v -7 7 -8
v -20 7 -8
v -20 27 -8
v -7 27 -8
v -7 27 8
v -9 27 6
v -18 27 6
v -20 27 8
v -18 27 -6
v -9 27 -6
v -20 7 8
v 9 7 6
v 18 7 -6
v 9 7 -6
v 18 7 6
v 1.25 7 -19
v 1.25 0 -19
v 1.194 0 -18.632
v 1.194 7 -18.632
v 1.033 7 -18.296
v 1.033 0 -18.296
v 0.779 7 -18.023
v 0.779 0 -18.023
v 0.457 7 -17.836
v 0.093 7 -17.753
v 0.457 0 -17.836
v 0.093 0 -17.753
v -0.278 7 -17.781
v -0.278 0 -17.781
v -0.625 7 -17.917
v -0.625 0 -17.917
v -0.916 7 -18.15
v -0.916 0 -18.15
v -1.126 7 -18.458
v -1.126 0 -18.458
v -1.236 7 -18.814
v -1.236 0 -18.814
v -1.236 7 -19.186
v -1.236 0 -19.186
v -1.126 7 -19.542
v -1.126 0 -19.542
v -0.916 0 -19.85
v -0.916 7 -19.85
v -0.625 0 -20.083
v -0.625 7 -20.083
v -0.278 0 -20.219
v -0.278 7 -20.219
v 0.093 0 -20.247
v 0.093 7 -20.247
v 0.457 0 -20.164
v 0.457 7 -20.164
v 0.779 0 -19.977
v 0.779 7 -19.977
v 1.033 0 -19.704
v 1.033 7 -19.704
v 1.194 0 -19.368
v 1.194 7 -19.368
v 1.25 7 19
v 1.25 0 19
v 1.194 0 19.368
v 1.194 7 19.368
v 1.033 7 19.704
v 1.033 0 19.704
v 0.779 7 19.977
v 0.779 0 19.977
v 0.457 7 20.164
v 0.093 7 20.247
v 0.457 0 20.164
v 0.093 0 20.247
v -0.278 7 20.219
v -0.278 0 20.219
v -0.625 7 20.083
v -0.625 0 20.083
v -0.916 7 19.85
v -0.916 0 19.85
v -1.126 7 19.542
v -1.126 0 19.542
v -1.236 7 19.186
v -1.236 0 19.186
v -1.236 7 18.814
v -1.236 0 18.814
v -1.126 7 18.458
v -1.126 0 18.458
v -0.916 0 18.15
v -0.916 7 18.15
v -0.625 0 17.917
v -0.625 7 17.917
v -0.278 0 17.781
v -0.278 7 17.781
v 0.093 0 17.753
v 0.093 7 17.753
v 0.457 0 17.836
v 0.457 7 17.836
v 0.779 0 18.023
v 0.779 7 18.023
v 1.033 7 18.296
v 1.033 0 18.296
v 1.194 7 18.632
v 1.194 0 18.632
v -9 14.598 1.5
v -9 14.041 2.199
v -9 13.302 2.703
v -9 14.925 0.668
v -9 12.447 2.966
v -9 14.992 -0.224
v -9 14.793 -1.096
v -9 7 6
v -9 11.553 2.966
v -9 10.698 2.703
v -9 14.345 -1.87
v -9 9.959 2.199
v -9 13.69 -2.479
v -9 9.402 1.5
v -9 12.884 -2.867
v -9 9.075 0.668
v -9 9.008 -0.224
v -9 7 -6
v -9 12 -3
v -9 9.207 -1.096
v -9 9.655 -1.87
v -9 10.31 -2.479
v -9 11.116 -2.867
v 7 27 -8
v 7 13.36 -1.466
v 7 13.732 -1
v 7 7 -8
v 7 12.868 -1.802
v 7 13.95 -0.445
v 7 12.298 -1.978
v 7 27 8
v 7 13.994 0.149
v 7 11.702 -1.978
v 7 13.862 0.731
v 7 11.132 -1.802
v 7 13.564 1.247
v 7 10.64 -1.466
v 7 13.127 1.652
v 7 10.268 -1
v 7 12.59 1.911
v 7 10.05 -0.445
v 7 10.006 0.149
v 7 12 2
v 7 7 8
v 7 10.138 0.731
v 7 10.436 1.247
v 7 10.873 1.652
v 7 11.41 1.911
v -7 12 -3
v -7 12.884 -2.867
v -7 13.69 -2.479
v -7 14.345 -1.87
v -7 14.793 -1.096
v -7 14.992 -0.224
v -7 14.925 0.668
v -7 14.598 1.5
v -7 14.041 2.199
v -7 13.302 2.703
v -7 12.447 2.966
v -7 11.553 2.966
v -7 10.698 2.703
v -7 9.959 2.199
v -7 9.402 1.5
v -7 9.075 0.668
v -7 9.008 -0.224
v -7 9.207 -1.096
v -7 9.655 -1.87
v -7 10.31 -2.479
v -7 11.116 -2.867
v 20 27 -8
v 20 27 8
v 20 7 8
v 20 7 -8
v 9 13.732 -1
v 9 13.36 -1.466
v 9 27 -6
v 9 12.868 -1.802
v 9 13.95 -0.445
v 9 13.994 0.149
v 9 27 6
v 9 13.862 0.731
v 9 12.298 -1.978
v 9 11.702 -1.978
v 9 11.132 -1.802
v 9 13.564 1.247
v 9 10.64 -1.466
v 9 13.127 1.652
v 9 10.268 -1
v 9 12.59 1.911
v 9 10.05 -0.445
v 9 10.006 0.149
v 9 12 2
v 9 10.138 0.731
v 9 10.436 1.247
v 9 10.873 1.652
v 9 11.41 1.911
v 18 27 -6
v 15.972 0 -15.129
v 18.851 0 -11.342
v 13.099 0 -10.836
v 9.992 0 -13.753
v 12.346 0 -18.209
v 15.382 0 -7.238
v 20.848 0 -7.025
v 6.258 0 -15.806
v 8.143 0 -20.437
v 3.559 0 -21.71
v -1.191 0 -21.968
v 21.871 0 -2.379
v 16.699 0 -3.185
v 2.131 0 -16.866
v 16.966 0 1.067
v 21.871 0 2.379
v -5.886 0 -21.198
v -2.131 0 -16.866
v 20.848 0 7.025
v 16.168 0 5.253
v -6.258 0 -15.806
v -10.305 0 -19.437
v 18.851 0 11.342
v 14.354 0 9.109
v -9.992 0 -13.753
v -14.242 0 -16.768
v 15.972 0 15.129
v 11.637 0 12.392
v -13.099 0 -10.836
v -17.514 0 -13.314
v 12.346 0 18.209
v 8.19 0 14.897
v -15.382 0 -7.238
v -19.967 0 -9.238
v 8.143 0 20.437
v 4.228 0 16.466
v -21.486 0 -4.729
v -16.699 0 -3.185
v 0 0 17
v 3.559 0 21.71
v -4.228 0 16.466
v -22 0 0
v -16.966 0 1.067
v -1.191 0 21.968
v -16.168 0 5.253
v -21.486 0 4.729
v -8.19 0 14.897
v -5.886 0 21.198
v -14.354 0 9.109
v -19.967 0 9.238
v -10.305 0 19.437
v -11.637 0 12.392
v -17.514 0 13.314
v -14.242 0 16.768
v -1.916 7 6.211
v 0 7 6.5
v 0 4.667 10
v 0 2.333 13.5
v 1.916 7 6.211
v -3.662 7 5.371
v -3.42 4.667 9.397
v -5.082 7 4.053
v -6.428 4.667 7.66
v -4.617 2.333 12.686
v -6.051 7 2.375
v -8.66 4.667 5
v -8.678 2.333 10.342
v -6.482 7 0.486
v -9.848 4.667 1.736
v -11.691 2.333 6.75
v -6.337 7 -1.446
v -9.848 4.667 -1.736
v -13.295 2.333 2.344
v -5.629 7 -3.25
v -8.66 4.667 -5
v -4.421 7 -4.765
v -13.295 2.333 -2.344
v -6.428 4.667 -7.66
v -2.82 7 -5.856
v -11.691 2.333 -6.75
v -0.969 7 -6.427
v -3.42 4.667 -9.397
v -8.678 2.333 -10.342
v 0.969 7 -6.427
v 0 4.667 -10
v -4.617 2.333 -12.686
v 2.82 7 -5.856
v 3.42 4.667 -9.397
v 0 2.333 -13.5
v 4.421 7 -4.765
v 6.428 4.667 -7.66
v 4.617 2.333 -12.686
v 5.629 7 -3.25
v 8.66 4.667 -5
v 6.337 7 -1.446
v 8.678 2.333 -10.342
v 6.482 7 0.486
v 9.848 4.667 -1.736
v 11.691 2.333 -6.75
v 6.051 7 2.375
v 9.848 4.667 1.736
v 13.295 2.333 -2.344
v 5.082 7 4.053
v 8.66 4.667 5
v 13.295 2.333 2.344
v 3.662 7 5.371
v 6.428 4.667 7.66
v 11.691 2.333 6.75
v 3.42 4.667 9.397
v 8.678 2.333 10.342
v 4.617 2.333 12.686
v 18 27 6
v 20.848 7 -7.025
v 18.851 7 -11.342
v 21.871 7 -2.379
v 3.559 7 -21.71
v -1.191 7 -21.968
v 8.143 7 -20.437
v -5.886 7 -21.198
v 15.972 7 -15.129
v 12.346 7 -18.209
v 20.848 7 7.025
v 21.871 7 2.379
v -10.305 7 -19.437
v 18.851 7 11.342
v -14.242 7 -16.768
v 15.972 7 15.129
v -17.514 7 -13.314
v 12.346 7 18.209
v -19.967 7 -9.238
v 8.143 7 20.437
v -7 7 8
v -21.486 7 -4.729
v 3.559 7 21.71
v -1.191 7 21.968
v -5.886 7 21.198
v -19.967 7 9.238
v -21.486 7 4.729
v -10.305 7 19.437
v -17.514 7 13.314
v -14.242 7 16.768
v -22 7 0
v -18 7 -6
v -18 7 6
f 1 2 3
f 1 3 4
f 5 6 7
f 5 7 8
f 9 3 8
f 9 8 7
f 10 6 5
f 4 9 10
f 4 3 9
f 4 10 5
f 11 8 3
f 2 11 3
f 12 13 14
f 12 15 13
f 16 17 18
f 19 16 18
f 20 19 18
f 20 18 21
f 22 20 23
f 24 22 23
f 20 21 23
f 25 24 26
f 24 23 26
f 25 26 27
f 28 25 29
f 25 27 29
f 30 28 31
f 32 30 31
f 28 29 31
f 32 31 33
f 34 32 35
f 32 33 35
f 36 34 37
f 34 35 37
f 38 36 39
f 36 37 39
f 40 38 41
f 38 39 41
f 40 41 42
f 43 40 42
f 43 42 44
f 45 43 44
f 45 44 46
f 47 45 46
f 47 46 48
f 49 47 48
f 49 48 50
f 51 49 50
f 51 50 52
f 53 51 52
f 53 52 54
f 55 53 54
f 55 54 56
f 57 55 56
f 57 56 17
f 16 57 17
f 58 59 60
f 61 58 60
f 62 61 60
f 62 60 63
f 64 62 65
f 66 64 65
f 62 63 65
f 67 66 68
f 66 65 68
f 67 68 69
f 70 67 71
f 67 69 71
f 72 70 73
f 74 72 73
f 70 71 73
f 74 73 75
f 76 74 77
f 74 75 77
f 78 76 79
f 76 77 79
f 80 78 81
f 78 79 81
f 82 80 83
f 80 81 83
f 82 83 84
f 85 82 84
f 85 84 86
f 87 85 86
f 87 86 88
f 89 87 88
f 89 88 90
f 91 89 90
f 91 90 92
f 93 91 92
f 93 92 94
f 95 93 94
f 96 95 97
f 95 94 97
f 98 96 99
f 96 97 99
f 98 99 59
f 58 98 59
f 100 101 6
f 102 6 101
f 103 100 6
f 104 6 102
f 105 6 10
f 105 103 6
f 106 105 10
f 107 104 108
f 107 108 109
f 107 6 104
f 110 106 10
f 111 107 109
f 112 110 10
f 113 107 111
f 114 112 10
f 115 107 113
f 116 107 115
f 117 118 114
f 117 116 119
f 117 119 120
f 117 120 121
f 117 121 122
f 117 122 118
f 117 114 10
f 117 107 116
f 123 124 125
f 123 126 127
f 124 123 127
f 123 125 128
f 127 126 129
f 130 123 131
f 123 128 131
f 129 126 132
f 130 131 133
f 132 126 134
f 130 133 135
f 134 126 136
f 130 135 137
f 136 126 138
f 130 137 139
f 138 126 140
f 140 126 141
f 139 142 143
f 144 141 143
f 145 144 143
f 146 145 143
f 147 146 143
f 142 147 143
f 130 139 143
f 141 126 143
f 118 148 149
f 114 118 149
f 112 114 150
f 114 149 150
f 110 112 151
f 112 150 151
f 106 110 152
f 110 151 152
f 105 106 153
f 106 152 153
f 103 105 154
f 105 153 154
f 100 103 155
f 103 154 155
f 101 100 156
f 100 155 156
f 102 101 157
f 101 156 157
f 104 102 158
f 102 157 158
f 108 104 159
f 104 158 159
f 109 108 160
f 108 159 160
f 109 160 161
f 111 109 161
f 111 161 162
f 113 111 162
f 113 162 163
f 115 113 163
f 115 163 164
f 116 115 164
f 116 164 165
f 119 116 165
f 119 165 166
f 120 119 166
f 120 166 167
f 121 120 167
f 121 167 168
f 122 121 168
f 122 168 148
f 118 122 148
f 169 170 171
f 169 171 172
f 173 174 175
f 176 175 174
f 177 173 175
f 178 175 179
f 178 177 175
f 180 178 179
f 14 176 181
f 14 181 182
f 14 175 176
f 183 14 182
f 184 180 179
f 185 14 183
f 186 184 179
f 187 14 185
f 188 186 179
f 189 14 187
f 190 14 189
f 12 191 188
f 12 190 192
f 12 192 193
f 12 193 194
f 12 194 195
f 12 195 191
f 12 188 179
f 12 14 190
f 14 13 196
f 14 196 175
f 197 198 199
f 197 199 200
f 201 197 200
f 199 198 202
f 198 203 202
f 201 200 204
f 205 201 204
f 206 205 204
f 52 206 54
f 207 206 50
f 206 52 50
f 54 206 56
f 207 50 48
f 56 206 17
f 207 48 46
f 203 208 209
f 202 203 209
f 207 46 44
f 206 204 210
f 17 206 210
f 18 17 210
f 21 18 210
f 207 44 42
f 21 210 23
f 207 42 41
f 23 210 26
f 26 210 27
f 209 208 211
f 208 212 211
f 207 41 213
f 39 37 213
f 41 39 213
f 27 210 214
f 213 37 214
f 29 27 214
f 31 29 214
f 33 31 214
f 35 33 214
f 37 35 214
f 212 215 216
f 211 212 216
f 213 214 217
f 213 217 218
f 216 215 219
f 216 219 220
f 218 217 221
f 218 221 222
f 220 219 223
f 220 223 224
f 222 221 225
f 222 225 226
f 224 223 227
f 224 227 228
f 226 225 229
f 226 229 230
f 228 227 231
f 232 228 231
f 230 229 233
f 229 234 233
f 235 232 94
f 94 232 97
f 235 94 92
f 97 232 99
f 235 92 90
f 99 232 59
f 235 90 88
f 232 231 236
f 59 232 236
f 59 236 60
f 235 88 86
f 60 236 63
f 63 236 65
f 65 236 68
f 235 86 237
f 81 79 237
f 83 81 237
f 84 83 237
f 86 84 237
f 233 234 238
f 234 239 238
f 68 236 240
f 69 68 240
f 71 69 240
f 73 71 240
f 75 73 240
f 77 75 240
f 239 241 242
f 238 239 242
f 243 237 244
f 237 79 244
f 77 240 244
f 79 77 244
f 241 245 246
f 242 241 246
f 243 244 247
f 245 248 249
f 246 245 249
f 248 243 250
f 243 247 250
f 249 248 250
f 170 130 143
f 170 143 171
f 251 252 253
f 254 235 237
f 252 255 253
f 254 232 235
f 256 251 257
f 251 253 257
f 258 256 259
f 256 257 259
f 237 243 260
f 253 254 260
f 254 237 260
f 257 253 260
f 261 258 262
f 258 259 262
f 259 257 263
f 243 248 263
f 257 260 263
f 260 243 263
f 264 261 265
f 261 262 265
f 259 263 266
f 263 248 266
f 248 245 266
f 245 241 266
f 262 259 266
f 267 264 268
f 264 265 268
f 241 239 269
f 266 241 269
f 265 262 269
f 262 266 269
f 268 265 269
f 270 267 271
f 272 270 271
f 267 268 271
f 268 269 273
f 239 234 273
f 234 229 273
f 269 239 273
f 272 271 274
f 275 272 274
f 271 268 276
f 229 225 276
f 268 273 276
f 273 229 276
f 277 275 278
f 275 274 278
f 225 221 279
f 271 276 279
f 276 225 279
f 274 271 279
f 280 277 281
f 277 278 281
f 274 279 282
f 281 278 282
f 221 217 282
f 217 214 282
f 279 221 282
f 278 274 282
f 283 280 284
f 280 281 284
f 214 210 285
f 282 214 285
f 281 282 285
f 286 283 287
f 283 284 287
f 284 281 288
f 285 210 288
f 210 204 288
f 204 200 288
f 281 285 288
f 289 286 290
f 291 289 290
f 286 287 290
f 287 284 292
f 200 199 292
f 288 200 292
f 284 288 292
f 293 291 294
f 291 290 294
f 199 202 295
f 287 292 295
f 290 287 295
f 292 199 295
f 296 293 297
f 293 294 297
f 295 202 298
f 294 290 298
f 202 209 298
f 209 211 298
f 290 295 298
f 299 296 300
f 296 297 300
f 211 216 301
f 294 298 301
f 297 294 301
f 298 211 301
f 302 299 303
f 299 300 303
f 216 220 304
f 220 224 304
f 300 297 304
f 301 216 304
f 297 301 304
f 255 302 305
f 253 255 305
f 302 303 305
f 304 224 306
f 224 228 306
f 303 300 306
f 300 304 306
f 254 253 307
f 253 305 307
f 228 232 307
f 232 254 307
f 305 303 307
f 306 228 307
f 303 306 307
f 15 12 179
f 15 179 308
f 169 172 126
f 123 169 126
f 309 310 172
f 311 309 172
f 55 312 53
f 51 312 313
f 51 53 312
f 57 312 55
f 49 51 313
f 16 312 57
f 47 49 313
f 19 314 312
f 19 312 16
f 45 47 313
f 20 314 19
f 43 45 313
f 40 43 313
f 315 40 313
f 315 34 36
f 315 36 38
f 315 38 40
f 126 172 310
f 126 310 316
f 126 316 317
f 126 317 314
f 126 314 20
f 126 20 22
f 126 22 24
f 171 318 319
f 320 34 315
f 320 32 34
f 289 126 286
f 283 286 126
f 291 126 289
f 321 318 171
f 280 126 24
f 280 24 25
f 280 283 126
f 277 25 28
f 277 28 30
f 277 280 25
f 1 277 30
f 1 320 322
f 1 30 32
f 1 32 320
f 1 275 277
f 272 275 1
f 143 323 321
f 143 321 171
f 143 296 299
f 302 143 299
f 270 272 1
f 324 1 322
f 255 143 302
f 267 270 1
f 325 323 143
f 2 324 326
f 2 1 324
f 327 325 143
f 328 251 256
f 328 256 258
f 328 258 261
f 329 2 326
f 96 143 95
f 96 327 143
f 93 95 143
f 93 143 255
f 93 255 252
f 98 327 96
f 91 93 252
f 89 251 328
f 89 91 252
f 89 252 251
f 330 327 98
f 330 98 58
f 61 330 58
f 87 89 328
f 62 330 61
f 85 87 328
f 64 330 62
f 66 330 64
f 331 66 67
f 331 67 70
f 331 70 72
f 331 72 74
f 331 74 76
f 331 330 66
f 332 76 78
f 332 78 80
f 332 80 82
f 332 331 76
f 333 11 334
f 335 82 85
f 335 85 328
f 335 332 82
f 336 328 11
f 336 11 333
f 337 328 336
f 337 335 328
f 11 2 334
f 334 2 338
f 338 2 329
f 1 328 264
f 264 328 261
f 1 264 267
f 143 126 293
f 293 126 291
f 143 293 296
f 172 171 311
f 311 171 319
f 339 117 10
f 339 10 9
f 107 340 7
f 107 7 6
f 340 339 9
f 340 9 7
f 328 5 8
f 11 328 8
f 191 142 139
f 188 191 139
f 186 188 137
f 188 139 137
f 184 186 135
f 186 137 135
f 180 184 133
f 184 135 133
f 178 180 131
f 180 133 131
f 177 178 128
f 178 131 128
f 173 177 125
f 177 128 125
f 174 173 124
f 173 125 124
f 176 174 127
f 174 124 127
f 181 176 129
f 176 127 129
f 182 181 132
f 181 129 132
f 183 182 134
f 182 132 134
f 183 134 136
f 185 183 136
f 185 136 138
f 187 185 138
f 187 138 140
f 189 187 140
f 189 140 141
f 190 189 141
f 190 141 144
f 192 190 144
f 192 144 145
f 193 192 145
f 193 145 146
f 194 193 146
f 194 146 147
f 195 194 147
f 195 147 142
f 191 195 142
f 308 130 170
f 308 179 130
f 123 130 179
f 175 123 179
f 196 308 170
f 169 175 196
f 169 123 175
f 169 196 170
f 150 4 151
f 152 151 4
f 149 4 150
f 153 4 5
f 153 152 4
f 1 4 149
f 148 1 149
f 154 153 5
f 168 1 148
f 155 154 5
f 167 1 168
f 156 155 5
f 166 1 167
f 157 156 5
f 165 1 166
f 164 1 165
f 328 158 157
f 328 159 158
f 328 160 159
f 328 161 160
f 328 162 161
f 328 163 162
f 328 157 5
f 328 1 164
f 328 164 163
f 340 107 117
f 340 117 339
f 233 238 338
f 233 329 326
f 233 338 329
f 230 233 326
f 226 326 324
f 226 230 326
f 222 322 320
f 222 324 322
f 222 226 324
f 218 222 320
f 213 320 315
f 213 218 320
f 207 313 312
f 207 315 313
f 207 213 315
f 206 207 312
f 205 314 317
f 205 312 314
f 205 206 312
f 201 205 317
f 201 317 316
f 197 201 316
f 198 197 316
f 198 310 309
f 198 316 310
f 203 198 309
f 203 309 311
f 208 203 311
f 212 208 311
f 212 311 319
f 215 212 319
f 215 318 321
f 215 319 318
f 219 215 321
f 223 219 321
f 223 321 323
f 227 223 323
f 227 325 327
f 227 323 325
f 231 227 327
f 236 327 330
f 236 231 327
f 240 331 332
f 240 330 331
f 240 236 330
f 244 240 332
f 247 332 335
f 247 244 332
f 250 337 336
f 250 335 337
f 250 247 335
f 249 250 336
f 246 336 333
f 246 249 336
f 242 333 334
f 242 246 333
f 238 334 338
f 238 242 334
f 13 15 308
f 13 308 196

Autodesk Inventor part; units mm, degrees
ref_plane "YZ Plane" through (0, 0, 0) normal (1, 0, 0) x (0, 1, 0)
ref_plane "XZ Plane" through (0, 0, 0) normal (0, 1, 0) x (-1, 0, 0)
ref_plane "XY Plane" through (0, 0, 0) normal (0, 0, 1) x (1, 0, 0)
sketch "Sketch1" plane through (0, 0, 0) normal (0, 1, 0) x (-1, 0, 0)
  circle A0 centre (0, 0) radius 22
  dimension "d0" = 44
extrude "Extrusion1" add sketch "Sketch1" along normal blind 7
sketch "Sketch3" plane through (0, 0, 0) normal (0, -1, 0) x (1, 0, 0)
  circle A0 centre (0, 0) radius 15
  dimension "d4" = 30
extrude "Extrusion2" [suppressed]
sketch "Sketch4" plane through (0, 2, 0) normal (0, -1, 0) x (1, 0, 0)
  circle A0 centre (0, 0) radius 12
  dimension "d11" = 24
extrude "Extrusion3" [suppressed]
sketch "Sketch5" plane through (0, 4, 0) normal (0, -1, 0) x (1, 0, 0)
  circle A0 centre (0, 0) radius 10
  dimension "d14" = 20
extrude "Extrusion4" [suppressed]
sketch "Sketch6" plane through (0, 6, 0) normal (0, -1, 0) x (1, 0, 0)
  circle A0 centre (0, 0) radius 8.5
  dimension "d17" = 17
extrude "Extrusion5" [suppressed]
sketch "Sketch7" plane through (0, 8, 0) normal (0, -1, 0) x (1, 0, 0)
  circle A0 centre (0, 0) radius 7
  dimension "d20" = 14
extrude "Extrusion6" [suppressed]
sketch "Sketch9" plane through (0, 7, 0) normal (0, 1, 0) x (1, 0, 0)
  line L0 (20, 8) -> (7, 8)
  line L1 (7, 8) -> (7, -8)
  line L2 (7, -8) -> (20, -8)
  line L3 (20, -8) -> (20, 8)
  line L4 (-20, 8) -> (-7, 8)
  line L5 (-7, 8) -> (-7, -8)
  line L6 (-7, -8) -> (-20, -8)
  line L7 (-20, -8) -> (-20, 8)
  line L8 (18, 6) -> (9, 6)
  line L9 (9, 6) -> (9, -6)
  line L10 (9, -6) -> (18, -6)
  line L11 (18, -6) -> (18, 6)
  line L12 (-9, 6) -> (-18, 6)
  line L13 (-18, 6) -> (-18, -6)
  line L14 (-18, -6) -> (-9, -6)
  line L15 (-9, -6) -> (-9, 6)
  point P0 (0, 0)
  point P1 (7, 0)
  point P2 (-7, 0)
  point P3 (9, 0)
  point P4 (-9, 0)
  dimension "d29" = 13
  dimension "d30" = 16
  dimension "d31" = 7
  dimension "d32" = 13
  dimension "d33" = 16
  dimension "d34" = 7
  dimension "d35" = 9
  dimension "d36" = 12
  dimension "d37" = 2
  dimension "d38" = 9
  dimension "d39" = 12
  dimension "d40" = 2
extrude "Extrusion8" add sketch "Sketch9" along normal blind 20
sketch "Sketch8" plane through (0, 0, 0) normal (0, -1, 0) x (1, 0, 0)
  circle A0 centre (0, 19) radius 1.25
  circle A1 centre (0, -19) radius 1.25
  point P0 (0, 0)
  dimension "d23" = 2.5
  dimension "d24" = 2.5
  dimension "d25" = 19
  dimension "d26" = 19
extrude "Extrusion7" cut sketch "Sketch8" against normal blind 14
sketch "Sketch10" plane through (-7, 10, 0) normal (1, 0, 0) x (0, 0, -1)
  circle A0 centre (0, 2) radius 3
  line L0 (-8, 17) -> (8, 17) projected
  point P0 (0, -10)
  dimension "d43" = 6
  dimension "d44" = 15
extrude "Extrusion9" cut sketch "Sketch10" against normal blind 2
sketch "Sketch11" plane through (7, 7, -8) normal (-1, 0, 0) x (0, 0, 1)
  circle A0 centre (8, 5) radius 2
  line L0 (0, 20) -> (16, 20) projected
  point P0 (8, -7)
  dimension "d47" = 4
  dimension "d48" = 15
extrude "Extrusion10" cut sketch "Sketch11" against normal blind 2
sketch "Sketch12" plane through (0, 0, 0) normal (1, 0, 0) x (0, 1, 0)
  line L0 (7, 6.5) -> (0, 17)
  line L1 (7, 0) -> (7, 6.5)
  line L2 (7, 0) -> (0, 0)
  line L3 (0, 0) -> (0, 17)
  line L4 (0, 22) -> (0, -22) projected
  dimension "d54" = 6.5
  dimension "d55" = 17
  dimension "d56" = 7
revolve "Revolution1" cut sketch "Sketch12" angle 360 about axis through (0, 7, 0) along (0, -1, 0)
properties part number "funil"
